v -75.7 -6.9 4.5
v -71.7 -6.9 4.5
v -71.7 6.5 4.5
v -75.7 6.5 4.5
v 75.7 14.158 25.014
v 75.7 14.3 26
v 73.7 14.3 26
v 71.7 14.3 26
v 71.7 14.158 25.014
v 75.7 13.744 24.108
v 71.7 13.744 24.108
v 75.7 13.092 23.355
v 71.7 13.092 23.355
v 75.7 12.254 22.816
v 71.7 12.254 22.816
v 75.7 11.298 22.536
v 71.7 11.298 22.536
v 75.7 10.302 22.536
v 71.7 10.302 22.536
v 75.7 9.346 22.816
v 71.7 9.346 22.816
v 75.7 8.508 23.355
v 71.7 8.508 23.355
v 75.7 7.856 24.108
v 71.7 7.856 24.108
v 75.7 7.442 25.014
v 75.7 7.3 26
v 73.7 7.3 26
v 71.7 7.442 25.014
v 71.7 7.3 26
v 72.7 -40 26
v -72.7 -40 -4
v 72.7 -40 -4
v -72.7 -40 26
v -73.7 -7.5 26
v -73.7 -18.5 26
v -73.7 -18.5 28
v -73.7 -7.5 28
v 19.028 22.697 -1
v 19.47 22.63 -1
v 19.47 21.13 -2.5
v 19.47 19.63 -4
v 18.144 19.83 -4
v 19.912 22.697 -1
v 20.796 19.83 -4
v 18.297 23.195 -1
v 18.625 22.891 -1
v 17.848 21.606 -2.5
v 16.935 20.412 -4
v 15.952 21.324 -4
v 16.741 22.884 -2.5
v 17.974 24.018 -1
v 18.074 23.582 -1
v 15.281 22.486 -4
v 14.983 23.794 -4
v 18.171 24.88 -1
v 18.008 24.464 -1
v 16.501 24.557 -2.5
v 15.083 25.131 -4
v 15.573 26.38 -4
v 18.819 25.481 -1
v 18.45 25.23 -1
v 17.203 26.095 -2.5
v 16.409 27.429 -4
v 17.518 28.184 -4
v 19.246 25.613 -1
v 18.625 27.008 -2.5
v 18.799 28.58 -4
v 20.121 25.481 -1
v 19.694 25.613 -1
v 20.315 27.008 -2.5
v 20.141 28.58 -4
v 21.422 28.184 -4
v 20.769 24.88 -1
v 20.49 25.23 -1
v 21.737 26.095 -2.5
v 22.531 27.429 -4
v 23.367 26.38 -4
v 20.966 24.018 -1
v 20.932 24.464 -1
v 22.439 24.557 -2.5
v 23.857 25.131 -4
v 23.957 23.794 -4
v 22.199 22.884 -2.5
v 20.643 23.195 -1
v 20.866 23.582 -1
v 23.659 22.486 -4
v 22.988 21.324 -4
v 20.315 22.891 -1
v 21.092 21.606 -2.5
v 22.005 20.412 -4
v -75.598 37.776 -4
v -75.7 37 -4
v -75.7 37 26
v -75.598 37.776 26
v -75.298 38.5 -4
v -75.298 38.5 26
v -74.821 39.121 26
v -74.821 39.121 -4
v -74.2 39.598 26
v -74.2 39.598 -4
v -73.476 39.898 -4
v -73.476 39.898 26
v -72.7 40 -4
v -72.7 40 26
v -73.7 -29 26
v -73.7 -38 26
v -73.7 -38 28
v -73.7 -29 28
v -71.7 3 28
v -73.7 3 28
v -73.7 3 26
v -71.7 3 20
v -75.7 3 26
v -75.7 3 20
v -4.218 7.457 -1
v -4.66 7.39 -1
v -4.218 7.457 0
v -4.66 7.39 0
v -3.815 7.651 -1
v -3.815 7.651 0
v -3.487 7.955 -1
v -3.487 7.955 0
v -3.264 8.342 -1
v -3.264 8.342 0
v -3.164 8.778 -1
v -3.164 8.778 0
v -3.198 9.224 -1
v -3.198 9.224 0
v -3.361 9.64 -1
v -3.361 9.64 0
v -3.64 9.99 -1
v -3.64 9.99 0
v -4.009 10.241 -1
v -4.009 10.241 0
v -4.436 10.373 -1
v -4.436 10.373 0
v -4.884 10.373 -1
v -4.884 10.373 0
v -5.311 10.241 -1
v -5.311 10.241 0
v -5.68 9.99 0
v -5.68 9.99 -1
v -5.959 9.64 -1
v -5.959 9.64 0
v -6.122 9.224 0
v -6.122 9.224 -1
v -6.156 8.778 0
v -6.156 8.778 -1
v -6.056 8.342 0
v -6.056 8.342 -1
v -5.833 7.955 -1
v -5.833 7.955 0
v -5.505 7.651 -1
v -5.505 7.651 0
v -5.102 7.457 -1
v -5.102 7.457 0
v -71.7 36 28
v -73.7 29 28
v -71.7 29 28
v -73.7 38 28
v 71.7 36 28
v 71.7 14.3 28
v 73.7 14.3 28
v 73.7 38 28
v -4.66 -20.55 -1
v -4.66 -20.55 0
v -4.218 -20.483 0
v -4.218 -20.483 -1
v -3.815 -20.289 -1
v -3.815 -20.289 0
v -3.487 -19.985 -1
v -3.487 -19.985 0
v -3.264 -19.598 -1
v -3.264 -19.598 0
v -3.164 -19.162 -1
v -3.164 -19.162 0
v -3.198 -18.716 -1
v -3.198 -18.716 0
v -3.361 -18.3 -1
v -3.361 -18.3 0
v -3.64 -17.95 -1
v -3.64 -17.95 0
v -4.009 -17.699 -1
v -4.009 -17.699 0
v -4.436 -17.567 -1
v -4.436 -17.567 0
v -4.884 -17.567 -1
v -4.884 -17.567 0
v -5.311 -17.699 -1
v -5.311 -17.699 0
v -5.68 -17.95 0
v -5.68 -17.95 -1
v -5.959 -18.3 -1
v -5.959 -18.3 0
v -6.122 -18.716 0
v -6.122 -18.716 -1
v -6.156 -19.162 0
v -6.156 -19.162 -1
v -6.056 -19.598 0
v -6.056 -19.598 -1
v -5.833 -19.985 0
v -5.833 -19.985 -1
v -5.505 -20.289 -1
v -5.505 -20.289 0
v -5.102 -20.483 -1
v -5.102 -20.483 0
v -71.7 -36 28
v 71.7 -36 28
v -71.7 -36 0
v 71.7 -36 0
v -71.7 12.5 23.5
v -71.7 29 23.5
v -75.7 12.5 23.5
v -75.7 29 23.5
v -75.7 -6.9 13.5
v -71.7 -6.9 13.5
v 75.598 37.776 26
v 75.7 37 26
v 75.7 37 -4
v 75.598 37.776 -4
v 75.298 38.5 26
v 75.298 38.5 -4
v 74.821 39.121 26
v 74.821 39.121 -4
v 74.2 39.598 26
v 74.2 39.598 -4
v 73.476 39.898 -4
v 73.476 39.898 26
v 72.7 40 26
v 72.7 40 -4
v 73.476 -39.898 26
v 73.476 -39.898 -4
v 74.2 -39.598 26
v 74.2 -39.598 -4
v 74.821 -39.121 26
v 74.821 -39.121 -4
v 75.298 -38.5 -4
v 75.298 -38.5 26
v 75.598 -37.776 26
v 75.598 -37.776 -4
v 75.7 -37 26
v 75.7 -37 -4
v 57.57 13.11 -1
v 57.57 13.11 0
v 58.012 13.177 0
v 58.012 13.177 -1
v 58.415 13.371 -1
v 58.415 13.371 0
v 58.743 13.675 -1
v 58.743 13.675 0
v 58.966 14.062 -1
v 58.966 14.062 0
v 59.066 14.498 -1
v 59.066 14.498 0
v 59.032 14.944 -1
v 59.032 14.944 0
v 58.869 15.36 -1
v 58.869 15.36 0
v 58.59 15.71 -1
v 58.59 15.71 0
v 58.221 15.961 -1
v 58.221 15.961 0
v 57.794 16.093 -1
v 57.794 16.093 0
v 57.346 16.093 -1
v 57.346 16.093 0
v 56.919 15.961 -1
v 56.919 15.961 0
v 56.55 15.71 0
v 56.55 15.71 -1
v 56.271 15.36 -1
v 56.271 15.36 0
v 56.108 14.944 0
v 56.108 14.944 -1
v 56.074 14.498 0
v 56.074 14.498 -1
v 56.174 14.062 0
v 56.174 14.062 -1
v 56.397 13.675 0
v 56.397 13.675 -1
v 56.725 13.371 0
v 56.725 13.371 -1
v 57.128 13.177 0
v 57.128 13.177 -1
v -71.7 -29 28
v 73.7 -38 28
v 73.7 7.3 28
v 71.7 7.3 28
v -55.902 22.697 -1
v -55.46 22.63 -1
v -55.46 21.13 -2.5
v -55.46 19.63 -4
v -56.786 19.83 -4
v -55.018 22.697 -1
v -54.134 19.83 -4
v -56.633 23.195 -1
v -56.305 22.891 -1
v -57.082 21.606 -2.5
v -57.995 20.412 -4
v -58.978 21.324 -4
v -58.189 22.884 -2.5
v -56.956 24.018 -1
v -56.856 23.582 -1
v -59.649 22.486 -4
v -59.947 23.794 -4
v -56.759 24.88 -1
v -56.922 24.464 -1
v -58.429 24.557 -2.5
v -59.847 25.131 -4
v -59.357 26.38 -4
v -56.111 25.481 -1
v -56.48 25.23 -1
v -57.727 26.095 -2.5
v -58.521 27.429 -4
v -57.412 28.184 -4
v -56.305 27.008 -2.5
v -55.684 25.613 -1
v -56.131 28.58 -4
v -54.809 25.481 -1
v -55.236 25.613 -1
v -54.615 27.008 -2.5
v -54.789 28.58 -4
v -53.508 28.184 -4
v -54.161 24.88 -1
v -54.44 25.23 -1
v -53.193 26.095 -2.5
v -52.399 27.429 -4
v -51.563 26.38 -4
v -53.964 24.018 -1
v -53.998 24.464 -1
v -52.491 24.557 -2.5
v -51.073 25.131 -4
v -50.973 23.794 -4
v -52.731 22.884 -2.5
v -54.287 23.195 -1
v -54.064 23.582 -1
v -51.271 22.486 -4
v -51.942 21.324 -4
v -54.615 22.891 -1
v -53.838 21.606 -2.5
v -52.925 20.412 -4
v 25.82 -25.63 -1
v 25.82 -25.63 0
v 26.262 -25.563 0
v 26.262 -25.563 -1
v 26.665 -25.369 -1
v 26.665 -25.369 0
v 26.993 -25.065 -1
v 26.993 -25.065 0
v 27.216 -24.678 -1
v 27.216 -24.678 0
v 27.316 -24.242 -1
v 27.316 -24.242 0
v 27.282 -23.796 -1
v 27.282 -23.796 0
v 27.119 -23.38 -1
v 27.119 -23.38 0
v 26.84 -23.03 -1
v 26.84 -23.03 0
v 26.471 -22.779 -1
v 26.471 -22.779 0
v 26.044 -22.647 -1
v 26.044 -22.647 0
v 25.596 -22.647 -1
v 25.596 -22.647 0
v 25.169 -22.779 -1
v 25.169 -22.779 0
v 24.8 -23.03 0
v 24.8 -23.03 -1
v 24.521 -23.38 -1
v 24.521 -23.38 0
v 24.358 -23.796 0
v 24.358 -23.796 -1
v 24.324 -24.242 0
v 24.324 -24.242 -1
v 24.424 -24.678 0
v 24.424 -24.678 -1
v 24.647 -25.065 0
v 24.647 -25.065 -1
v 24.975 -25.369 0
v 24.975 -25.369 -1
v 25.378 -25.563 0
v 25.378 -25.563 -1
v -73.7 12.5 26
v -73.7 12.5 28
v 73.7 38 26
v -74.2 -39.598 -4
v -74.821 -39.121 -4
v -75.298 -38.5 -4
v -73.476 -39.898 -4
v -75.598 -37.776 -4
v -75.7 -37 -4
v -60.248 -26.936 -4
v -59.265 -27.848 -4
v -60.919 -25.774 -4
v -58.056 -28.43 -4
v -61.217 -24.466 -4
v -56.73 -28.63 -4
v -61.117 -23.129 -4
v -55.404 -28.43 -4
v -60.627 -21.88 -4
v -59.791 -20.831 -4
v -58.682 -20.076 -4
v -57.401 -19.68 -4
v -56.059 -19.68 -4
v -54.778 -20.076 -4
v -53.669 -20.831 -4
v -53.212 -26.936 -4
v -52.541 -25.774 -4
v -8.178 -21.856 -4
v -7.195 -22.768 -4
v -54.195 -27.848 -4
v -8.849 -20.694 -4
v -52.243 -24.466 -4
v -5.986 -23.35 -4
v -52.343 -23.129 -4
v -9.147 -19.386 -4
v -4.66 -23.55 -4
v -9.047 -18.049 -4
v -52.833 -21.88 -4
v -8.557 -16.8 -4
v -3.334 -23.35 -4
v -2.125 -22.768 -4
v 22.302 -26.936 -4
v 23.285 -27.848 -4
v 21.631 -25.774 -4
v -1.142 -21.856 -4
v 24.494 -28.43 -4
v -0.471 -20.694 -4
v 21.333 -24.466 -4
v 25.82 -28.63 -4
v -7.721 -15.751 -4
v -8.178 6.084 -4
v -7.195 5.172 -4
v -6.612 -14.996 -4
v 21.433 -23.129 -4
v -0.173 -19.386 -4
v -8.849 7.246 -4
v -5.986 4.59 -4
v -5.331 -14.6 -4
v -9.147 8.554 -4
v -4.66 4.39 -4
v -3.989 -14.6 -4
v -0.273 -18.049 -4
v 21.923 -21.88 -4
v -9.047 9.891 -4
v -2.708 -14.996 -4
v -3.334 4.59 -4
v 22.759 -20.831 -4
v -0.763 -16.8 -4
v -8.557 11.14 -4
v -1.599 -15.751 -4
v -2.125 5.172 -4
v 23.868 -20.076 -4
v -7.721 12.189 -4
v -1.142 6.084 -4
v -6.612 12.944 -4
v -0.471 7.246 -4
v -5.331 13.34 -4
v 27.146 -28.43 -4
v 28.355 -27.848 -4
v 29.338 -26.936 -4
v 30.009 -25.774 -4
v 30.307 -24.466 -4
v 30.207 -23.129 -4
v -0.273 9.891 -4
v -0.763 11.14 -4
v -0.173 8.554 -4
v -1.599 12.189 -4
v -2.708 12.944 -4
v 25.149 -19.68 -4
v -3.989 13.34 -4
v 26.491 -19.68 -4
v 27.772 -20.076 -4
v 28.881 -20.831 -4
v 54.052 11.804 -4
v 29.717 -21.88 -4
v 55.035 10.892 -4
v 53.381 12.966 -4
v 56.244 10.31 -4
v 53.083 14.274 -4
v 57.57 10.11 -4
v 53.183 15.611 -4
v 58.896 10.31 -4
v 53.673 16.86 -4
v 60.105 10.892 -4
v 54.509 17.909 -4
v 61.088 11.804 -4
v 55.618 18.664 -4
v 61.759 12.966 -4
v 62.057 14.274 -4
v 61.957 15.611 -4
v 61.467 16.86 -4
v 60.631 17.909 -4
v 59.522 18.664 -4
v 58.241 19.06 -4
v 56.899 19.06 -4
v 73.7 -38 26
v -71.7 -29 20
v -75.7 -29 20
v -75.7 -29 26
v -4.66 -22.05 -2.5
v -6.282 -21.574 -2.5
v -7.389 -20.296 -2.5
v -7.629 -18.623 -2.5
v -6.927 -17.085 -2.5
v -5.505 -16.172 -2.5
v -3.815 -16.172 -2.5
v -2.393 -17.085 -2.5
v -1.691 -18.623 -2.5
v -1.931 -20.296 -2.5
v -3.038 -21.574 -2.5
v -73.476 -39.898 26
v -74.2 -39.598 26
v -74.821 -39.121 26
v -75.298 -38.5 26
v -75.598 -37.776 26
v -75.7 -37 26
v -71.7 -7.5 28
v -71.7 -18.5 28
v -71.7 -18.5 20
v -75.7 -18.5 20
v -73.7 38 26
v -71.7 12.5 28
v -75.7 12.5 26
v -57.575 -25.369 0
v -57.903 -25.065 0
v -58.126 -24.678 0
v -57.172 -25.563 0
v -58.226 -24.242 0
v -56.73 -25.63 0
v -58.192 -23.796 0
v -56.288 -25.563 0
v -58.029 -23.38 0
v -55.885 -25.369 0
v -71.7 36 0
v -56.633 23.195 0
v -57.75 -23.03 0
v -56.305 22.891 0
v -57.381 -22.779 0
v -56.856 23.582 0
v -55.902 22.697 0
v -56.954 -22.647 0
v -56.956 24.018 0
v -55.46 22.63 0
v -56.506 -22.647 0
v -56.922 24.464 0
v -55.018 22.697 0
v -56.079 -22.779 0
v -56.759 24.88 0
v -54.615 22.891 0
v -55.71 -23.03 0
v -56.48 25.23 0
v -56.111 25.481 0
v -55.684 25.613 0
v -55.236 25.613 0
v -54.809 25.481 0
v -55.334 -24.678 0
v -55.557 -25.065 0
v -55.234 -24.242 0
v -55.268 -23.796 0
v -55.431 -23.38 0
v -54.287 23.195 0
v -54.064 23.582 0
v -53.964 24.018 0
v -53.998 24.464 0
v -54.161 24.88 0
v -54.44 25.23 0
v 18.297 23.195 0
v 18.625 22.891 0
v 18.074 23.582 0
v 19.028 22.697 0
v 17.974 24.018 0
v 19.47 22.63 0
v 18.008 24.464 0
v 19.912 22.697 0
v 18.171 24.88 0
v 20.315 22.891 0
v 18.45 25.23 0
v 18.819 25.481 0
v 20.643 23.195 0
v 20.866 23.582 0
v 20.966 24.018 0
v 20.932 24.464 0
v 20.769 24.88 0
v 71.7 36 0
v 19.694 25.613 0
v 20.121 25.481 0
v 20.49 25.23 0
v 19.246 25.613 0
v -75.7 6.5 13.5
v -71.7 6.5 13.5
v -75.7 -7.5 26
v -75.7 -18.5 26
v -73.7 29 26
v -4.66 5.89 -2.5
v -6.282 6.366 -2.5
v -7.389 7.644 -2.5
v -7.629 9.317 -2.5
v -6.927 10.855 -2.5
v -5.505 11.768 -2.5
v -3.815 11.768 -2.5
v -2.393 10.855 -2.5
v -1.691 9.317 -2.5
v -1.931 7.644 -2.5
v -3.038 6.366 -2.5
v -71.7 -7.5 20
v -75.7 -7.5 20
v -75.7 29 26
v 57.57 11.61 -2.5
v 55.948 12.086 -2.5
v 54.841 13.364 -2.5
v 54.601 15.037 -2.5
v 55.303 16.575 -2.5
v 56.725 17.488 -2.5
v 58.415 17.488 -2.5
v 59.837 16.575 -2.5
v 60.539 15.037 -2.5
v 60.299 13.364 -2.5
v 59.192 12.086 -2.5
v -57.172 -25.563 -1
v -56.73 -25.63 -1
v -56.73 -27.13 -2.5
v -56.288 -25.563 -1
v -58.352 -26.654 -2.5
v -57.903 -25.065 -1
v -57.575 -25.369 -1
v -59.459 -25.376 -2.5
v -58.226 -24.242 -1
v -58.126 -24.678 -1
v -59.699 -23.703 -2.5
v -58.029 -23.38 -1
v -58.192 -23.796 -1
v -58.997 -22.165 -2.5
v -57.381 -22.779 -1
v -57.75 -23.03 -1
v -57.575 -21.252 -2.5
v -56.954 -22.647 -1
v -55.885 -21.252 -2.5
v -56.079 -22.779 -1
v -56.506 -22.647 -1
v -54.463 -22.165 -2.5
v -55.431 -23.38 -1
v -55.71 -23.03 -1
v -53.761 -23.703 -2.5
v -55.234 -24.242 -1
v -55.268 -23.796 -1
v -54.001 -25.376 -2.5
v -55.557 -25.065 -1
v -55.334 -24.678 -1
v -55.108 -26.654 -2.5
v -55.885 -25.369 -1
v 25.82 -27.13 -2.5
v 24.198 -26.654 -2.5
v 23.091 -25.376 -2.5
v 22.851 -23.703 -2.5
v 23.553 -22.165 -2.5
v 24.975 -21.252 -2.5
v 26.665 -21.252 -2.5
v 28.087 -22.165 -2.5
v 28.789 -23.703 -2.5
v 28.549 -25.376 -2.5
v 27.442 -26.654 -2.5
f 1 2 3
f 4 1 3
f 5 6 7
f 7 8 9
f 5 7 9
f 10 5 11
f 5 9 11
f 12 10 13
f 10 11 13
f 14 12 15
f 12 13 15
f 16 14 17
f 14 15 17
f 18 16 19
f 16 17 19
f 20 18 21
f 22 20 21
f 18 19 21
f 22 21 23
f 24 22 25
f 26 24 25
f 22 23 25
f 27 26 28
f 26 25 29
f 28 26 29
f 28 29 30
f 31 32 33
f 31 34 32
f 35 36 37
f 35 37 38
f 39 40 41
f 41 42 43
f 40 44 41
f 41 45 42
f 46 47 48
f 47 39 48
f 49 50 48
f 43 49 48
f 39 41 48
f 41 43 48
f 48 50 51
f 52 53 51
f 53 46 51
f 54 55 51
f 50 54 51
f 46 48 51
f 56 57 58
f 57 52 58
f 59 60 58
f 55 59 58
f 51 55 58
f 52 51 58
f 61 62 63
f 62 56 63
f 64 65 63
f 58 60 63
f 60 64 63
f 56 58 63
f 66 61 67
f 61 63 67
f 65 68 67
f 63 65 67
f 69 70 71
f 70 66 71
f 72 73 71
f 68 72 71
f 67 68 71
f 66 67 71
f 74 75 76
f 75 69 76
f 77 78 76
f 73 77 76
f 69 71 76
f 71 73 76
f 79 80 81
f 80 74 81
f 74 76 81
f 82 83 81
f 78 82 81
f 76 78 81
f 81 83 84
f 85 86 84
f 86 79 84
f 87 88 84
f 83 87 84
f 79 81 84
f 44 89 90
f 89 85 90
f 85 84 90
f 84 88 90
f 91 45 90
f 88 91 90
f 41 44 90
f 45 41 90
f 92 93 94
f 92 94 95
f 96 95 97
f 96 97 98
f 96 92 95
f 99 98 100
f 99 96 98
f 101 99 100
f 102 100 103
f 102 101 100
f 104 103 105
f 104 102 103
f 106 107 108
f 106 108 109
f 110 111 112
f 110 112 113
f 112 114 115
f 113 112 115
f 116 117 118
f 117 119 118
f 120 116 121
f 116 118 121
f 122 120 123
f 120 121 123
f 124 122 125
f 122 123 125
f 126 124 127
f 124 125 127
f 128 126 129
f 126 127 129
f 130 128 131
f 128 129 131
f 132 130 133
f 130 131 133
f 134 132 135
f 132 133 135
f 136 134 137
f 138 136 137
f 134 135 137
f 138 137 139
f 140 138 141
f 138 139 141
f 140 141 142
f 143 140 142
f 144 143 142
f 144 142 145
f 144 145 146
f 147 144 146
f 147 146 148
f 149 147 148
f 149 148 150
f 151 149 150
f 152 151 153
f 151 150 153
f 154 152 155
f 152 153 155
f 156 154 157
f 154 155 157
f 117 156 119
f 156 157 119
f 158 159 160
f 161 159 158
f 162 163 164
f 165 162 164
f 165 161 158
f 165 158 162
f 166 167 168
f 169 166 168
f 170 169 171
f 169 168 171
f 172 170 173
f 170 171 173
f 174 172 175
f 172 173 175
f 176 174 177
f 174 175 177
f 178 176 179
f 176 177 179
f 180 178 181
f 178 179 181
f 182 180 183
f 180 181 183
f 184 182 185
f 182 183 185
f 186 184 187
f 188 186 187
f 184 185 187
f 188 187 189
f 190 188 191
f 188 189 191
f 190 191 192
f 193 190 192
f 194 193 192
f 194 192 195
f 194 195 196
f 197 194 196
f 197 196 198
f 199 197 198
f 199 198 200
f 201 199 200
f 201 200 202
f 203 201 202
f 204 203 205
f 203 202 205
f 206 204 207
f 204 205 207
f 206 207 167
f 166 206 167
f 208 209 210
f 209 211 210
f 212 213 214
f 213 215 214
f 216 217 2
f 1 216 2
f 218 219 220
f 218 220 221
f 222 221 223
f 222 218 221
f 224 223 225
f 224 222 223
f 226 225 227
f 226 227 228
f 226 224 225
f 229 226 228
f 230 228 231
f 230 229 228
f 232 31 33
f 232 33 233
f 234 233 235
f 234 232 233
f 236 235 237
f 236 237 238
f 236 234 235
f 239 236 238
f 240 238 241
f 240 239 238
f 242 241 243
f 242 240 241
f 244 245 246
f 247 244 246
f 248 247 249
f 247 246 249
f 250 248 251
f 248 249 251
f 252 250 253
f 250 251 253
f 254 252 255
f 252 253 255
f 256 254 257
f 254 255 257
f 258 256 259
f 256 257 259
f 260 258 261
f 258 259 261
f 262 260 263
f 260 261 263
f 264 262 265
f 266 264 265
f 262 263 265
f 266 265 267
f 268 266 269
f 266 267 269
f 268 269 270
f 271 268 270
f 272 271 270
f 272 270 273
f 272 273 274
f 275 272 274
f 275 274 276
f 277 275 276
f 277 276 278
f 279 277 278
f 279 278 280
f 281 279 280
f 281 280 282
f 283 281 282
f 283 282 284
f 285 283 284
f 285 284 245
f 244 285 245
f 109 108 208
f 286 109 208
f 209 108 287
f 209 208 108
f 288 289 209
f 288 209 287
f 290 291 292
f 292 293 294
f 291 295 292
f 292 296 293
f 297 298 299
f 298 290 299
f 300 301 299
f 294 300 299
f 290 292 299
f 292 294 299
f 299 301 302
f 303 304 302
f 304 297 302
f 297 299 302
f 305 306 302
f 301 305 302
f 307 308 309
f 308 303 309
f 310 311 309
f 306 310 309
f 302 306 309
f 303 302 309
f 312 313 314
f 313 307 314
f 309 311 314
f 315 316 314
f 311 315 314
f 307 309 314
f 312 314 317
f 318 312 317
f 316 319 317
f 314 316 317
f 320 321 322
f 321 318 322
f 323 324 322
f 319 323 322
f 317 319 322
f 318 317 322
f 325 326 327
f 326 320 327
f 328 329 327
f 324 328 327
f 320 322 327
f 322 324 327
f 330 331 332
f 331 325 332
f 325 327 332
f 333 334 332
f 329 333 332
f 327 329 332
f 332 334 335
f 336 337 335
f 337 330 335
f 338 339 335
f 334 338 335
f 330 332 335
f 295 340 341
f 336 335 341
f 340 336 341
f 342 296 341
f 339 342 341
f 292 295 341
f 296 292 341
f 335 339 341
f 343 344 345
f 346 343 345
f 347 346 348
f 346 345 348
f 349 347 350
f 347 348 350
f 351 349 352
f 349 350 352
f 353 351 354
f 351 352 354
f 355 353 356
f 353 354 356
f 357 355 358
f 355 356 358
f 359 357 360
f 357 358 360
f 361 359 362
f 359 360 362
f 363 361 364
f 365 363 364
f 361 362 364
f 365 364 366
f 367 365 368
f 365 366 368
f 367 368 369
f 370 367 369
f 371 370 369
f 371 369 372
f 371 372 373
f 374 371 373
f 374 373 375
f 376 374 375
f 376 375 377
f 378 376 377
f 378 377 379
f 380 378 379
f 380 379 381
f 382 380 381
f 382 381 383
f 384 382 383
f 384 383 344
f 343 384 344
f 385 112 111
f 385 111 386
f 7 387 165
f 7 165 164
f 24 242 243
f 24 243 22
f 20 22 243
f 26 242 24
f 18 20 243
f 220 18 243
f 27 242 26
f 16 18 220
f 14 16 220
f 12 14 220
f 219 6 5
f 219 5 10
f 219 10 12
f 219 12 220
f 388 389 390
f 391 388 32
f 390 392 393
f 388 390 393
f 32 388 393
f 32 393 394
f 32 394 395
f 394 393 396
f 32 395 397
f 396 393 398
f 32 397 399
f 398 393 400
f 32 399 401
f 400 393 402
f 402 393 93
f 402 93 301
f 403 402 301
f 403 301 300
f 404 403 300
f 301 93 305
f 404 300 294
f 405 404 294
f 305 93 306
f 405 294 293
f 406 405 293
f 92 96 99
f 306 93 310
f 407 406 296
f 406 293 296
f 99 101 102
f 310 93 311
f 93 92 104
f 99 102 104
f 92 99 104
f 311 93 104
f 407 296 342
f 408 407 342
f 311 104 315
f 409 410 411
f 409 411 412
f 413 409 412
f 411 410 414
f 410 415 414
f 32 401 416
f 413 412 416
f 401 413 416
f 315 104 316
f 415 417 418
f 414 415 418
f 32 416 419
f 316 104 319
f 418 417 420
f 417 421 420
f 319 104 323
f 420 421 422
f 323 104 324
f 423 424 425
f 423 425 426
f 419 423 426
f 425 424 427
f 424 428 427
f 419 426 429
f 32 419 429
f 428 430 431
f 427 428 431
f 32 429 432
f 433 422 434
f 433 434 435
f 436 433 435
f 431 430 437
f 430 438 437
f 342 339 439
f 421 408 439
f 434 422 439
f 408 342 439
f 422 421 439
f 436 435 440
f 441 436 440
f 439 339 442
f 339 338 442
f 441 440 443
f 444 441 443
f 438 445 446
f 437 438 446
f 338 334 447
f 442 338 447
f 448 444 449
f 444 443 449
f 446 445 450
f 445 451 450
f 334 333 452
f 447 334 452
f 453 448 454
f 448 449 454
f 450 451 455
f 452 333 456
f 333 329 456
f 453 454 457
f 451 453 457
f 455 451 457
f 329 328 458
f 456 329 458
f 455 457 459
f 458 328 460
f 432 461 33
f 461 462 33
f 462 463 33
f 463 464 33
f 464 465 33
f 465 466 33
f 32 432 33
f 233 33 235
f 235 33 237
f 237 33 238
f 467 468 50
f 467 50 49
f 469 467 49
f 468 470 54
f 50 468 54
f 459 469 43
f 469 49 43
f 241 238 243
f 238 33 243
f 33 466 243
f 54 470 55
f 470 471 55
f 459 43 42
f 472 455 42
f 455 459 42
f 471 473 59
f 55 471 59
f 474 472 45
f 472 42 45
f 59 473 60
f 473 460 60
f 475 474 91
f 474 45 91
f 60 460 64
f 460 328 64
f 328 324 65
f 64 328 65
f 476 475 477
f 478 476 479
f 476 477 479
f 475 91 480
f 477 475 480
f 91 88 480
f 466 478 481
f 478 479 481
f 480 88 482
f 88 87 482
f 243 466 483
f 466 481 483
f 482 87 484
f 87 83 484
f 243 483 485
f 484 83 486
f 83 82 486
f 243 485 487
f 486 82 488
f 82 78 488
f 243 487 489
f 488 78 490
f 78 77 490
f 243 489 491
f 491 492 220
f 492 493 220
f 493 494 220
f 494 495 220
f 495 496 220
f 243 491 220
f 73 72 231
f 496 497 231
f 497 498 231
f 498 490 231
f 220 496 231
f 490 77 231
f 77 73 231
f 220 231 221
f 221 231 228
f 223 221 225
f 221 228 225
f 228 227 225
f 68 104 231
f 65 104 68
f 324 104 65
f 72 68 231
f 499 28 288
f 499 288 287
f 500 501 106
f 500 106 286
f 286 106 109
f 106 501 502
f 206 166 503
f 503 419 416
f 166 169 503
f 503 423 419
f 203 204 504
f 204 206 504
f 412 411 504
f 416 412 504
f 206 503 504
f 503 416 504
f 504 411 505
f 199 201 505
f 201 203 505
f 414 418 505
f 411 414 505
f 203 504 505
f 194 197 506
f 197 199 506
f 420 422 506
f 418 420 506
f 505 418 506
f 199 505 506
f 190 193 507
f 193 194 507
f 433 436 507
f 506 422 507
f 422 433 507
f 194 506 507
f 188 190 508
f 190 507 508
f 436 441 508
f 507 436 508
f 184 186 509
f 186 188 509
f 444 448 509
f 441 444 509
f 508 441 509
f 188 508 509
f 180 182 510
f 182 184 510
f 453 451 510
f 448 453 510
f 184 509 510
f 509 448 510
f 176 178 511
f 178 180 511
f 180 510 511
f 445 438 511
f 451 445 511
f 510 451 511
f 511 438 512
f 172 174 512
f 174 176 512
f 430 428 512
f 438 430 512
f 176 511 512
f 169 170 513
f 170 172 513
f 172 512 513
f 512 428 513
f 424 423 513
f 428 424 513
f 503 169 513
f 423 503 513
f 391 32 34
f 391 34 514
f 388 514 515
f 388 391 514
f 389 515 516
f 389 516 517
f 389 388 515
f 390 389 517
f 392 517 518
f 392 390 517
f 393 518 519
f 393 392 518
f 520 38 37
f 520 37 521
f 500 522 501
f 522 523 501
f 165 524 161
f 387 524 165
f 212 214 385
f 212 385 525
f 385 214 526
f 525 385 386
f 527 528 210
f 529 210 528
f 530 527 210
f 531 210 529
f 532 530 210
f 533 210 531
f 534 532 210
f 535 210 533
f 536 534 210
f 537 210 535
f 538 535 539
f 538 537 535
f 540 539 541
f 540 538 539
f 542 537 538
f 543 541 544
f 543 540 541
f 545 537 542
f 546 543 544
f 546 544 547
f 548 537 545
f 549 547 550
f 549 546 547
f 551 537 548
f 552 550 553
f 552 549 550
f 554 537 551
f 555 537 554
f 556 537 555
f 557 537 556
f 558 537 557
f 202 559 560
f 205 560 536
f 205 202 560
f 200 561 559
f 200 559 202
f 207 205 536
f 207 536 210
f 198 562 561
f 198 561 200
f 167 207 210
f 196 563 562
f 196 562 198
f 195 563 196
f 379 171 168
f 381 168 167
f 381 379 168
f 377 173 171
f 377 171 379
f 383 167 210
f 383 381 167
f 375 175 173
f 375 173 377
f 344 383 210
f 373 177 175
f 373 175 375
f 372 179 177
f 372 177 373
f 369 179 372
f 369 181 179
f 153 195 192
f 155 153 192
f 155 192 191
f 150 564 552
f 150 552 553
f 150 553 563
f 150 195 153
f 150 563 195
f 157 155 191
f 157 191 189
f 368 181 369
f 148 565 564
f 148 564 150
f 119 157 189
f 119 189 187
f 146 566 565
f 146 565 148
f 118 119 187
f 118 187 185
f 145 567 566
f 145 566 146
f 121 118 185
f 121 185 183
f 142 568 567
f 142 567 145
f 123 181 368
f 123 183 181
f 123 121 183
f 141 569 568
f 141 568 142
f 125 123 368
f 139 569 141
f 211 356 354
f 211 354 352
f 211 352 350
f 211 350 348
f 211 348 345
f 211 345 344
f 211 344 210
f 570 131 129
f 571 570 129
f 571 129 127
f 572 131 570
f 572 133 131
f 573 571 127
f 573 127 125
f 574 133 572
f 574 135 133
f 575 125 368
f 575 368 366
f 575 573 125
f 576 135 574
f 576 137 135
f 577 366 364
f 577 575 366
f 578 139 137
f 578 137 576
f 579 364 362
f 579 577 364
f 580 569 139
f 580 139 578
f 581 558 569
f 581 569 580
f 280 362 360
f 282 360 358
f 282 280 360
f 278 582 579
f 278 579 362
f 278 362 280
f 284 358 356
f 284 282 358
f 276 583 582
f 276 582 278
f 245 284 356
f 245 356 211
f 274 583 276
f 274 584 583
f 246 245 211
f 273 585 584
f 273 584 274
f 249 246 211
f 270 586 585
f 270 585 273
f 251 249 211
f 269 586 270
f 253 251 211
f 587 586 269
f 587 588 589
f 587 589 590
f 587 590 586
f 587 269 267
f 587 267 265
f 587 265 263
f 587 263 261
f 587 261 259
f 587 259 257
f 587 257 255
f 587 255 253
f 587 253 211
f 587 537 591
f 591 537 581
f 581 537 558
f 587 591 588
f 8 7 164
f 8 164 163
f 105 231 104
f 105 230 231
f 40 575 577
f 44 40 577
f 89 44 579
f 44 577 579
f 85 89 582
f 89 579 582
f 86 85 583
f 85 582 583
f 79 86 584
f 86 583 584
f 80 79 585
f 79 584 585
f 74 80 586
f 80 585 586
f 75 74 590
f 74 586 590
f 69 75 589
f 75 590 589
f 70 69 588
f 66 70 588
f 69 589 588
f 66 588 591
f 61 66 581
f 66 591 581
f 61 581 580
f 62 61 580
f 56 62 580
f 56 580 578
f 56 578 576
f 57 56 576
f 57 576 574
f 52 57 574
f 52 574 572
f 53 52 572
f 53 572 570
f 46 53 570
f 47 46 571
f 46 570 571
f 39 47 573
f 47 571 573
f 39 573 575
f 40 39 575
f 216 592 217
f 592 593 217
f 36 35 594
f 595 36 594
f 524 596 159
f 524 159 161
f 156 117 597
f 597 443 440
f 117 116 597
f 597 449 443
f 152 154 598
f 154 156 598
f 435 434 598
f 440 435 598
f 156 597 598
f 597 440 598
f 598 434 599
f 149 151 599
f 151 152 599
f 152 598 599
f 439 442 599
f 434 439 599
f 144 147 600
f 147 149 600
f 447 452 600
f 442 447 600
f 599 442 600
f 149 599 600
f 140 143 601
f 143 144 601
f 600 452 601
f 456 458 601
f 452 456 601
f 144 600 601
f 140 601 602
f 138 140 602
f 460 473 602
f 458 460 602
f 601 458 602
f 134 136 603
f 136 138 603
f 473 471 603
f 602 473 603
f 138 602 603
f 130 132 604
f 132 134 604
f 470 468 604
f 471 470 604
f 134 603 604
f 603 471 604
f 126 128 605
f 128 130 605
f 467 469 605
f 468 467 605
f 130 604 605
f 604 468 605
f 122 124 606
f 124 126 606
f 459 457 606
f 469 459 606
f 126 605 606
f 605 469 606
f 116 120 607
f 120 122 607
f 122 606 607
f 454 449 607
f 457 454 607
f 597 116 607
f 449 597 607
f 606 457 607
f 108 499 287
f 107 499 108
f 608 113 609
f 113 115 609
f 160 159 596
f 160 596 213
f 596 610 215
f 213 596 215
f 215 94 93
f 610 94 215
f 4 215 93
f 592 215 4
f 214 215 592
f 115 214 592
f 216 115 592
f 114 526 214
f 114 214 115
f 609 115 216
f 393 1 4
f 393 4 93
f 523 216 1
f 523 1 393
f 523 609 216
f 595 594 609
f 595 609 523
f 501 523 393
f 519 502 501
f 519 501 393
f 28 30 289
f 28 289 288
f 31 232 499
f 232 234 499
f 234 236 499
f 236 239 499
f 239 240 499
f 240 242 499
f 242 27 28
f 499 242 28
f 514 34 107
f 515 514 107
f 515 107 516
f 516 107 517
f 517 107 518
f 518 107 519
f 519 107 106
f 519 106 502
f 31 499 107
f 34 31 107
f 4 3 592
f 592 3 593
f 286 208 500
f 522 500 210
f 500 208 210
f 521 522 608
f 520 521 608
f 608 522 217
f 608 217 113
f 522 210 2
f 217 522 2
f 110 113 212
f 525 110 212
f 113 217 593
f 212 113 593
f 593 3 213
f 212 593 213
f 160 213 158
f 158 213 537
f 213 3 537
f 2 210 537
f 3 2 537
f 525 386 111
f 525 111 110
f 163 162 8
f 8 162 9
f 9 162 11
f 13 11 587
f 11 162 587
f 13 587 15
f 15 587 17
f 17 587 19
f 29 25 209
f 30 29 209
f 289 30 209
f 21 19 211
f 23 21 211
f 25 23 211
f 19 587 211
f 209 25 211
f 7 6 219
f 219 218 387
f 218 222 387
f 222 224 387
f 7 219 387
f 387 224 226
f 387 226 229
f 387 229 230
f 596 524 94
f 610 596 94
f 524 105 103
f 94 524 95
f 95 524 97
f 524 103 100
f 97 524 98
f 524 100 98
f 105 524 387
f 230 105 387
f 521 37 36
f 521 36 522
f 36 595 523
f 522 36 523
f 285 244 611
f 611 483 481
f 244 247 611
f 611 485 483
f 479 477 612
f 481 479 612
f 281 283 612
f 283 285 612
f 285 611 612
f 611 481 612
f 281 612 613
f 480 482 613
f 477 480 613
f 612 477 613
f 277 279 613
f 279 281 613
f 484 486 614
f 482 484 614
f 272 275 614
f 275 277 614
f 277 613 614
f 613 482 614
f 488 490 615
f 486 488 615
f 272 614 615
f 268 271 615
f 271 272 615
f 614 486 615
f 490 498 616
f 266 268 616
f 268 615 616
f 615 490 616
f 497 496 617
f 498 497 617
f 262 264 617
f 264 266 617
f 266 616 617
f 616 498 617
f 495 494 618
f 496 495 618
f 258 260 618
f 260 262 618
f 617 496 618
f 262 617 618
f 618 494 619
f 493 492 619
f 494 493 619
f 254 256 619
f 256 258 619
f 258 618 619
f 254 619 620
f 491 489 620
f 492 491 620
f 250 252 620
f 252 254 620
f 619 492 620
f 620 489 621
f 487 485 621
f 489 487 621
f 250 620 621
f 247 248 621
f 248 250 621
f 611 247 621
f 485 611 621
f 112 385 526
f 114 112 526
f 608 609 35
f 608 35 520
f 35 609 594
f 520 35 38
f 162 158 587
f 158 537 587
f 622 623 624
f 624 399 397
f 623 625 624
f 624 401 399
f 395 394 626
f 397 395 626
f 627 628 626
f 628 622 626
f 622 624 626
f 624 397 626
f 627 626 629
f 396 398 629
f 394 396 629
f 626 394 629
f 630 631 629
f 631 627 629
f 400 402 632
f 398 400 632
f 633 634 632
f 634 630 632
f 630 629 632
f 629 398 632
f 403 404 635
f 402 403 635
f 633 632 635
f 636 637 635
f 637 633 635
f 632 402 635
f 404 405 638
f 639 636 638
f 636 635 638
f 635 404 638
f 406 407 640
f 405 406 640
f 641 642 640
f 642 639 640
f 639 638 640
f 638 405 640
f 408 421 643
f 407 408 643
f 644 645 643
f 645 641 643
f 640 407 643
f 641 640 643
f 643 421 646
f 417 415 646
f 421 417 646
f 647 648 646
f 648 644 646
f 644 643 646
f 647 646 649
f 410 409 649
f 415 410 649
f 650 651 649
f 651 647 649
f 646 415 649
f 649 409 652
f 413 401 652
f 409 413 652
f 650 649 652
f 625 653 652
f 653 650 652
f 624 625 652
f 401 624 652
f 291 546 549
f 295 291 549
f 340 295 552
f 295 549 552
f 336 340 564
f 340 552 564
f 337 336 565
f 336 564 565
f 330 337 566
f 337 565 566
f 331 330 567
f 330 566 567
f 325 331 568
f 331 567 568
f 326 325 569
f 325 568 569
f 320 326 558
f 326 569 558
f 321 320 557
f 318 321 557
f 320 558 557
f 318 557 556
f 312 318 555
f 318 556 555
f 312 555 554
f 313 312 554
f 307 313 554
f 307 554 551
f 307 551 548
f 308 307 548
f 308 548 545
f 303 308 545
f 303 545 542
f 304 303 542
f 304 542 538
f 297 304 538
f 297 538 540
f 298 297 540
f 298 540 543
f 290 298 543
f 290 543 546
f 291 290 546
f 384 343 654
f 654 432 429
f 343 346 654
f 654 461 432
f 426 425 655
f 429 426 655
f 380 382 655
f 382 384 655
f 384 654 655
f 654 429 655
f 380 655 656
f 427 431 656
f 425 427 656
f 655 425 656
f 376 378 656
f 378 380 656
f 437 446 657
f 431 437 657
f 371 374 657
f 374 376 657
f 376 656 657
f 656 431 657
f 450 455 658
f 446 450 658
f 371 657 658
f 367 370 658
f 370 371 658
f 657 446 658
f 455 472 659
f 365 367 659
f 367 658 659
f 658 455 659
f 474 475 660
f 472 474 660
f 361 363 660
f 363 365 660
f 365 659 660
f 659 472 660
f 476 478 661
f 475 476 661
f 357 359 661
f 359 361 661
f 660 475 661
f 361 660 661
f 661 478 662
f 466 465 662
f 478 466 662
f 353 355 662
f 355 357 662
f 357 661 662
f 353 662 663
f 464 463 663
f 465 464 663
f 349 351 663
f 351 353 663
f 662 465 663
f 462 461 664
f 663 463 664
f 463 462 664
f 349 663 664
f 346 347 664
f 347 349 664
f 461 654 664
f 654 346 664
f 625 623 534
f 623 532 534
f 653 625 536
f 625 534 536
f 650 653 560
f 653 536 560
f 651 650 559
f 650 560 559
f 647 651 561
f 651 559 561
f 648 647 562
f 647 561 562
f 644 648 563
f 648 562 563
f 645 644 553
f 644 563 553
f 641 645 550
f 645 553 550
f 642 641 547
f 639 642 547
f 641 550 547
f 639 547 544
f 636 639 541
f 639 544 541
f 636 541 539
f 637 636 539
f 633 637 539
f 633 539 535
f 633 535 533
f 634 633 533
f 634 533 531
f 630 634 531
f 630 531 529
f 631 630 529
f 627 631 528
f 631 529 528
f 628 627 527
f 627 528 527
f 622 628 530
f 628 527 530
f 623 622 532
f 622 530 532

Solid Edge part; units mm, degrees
sketch "Sketch1" plane through (0, 0, 0) normal (0, 0, 1) x (1, 0, 0)
  line L0 (-75.7, -40) -> (75.7, -40)
  line L1 (75.7, -40) -> (75.7, 40)
  line L2 (75.7, 40) -> (-75.7, 40)
  line L3 (-75.7, 40) -> (-75.7, -40)
  dimension "D1" = 80
  dimension "D2" = 151.4
extrude "Protrusion1" add sketch "Sketch1" against normal blind 4
sketch "Sketch2" plane through (0, 0, 0) normal (0, 0, 1) x (1, 0, 0)
  line L0 (-75.7, 40) -> (75.7, 40)
  line L1 (75.7, 40) -> (75.7, -40)
  line L2 (75.7, -40) -> (-75.7, -40)
  line L3 (-75.7, -40) -> (-75.7, 40)
  line L4 (-71.7, 36) -> (71.7, 36)
  line L5 (71.7, 36) -> (71.7, -36)
  line L6 (71.7, -36) -> (-71.7, -36)
  line L7 (-71.7, -36) -> (-71.7, 36)
  dimension "D1" = 4
  dimension "D2" = 4
  dimension "D3" = 4
  dimension "D4" = 4
extrude "ExtrudedProtrusion_2" add sketch "Sketch2" along normal blind 26
sketch "Sketch3" plane through (-71.7, 0, 8) normal (1, 0, 0) x (0, 1, 0)
  line L0 (-6.9, -3.5) -> (6.5, -3.5)
  line L1 (6.5, -3.5) -> (6.5, 5.5)
  line L2 (6.5, 5.5) -> (-6.9, 5.5)
  line L3 (-6.9, 5.5) -> (-6.9, -3.5)
  dimension "D1" = 9
  dimension "D2" = 29.1
  dimension "D3" = 4.5
extrude "Cutout1" cut sketch "Sketch3" against normal up to next
sketch "Sketch4" plane through (-75.7, 0, 11) normal (-1, 0, 0) x (0, -1, 0)
  line L0 (7.5, 15) -> (-3, 15)
  line L1 (-3, 15) -> (-3, 9)
  line L2 (-3, 9) -> (7.5, 9)
  line L3 (7.5, 9) -> (7.5, 15)
  line L4 (29, 15) -> (18.5, 15)
  line L5 (18.5, 15) -> (18.5, 9)
  line L6 (18.5, 9) -> (29, 9)
  line L7 (29, 9) -> (29, 15)
  line L8 (-12.5, 15) -> (-29, 15)
  line L9 (-29, 15) -> (-29, 12.5)
  line L10 (-29, 12.5) -> (-12.5, 12.5)
  line L11 (-12.5, 12.5) -> (-12.5, 15)
  dimension "D1" = 10.5
  dimension "D2" = 16.5
  dimension "D3" = 10.5
  dimension "D4" = 20
  dimension "D5" = 23.5
  dimension "D6" = 7
  dimension "D7" = 65
  dimension "D8" = 7
  dimension "D9" = 9.5
  dimension "D10" = 11
extrude "Cutout2" cut sketch "Sketch4" against normal up to next
sketch "Sketch5" plane through (71.7, 0, 13) normal (-1, 0, 0) x (0, -1, 0)
  circle A0 centre (-10.8, 13) radius 3.5
  dimension "D1" = 29.2
extrude "Cutout3" cut sketch "Sketch5" against normal up to next
sketch "Sketch6" plane through (0, 24.15, 26) normal (0, 0, 1) x (0, -1, 0)
  line L0 (16.85, 71.7) -> (60.15, 71.7)
  line L1 (60.15, 71.7) -> (60.15, -71.7)
  line L2 (60.15, -71.7) -> (53.15, -71.7)
  line L3 (53.15, -71.7) -> (53.15, -73.7)
  line L4 (62.15, -73.7) -> (53.15, -73.7)
  line L5 (62.15, 73.7) -> (62.15, -73.7)
  line L6 (16.85, 73.7) -> (62.15, 73.7)
  line L7 (16.85, 71.7) -> (16.85, 73.7)
  line L8 (-11.85, -71.7) -> (-11.85, 71.7)
  line L9 (-11.85, 71.7) -> (9.85, 71.7)
  line L10 (9.85, 73.7) -> (9.85, 71.7)
  line L11 (-13.85, 73.7) -> (9.85, 73.7)
  line L12 (-13.85, -73.7) -> (-13.85, 73.7)
  line L13 (-4.85, -73.7) -> (-13.85, -73.7)
  line L14 (-4.85, -73.7) -> (-4.85, -71.7)
  line L15 (-4.85, -71.7) -> (-11.85, -71.7)
  line L16 (21.15, -71.7) -> (11.65, -71.7)
  line L17 (11.65, -71.7) -> (11.65, -73.7)
  line L18 (21.15, -73.7) -> (11.65, -73.7)
  line L19 (21.15, -73.7) -> (21.15, -71.7)
  line L20 (31.65, -71.7) -> (31.65, -73.7)
  line L21 (42.65, -73.7) -> (31.65, -73.7)
  line L22 (42.65, -73.7) -> (42.65, -71.7)
  line L23 (42.65, -71.7) -> (31.65, -71.7)
extrude "Protrusion2" add sketch "Sketch6" along normal blind 2
hole "Hole_8" at (-55.46, 24.13, 0) direction (0, 0, -1) diameter 3 end up to next
hole "Hole1" at (-56.73, -24.13, 0) direction (0, 0, -1) diameter 3 end up to next
hole "Hole2" at (-4.66, 8.89, 0) direction (0, 0, -1) diameter 3 end up to next
hole "Hole3" at (-4.66, -19.05, 0) direction (0, 0, -1) diameter 3 end up to next
hole "Hole4" at (19.47, 24.13, 0) direction (0, 0, -1) diameter 3 end up to next
hole "Hole5" at (57.57, 14.61, 0) direction (0, 0, -1) diameter 3 end up to next
hole "Hole6" at (25.82, -24.13, 0) direction (0, 0, -1) diameter 3 end up to next
fillet "Round1" radius 3 4 edges at (-75.7, 40, 11) (-75.7, -40, 11) (75.7, -40, 11) (75.7, 40, 11)
chamfer "Chamfer1" distance 3 angle 45 7 edges at (24.32, -24.13, -4) (56.07, 14.61, -4) (17.97, 24.13, -4) (-6.16, 8.89, -4) (-6.16, -19.05, -4) (-56.96, 24.13, -4) (-58.23, -24.13, -4)
